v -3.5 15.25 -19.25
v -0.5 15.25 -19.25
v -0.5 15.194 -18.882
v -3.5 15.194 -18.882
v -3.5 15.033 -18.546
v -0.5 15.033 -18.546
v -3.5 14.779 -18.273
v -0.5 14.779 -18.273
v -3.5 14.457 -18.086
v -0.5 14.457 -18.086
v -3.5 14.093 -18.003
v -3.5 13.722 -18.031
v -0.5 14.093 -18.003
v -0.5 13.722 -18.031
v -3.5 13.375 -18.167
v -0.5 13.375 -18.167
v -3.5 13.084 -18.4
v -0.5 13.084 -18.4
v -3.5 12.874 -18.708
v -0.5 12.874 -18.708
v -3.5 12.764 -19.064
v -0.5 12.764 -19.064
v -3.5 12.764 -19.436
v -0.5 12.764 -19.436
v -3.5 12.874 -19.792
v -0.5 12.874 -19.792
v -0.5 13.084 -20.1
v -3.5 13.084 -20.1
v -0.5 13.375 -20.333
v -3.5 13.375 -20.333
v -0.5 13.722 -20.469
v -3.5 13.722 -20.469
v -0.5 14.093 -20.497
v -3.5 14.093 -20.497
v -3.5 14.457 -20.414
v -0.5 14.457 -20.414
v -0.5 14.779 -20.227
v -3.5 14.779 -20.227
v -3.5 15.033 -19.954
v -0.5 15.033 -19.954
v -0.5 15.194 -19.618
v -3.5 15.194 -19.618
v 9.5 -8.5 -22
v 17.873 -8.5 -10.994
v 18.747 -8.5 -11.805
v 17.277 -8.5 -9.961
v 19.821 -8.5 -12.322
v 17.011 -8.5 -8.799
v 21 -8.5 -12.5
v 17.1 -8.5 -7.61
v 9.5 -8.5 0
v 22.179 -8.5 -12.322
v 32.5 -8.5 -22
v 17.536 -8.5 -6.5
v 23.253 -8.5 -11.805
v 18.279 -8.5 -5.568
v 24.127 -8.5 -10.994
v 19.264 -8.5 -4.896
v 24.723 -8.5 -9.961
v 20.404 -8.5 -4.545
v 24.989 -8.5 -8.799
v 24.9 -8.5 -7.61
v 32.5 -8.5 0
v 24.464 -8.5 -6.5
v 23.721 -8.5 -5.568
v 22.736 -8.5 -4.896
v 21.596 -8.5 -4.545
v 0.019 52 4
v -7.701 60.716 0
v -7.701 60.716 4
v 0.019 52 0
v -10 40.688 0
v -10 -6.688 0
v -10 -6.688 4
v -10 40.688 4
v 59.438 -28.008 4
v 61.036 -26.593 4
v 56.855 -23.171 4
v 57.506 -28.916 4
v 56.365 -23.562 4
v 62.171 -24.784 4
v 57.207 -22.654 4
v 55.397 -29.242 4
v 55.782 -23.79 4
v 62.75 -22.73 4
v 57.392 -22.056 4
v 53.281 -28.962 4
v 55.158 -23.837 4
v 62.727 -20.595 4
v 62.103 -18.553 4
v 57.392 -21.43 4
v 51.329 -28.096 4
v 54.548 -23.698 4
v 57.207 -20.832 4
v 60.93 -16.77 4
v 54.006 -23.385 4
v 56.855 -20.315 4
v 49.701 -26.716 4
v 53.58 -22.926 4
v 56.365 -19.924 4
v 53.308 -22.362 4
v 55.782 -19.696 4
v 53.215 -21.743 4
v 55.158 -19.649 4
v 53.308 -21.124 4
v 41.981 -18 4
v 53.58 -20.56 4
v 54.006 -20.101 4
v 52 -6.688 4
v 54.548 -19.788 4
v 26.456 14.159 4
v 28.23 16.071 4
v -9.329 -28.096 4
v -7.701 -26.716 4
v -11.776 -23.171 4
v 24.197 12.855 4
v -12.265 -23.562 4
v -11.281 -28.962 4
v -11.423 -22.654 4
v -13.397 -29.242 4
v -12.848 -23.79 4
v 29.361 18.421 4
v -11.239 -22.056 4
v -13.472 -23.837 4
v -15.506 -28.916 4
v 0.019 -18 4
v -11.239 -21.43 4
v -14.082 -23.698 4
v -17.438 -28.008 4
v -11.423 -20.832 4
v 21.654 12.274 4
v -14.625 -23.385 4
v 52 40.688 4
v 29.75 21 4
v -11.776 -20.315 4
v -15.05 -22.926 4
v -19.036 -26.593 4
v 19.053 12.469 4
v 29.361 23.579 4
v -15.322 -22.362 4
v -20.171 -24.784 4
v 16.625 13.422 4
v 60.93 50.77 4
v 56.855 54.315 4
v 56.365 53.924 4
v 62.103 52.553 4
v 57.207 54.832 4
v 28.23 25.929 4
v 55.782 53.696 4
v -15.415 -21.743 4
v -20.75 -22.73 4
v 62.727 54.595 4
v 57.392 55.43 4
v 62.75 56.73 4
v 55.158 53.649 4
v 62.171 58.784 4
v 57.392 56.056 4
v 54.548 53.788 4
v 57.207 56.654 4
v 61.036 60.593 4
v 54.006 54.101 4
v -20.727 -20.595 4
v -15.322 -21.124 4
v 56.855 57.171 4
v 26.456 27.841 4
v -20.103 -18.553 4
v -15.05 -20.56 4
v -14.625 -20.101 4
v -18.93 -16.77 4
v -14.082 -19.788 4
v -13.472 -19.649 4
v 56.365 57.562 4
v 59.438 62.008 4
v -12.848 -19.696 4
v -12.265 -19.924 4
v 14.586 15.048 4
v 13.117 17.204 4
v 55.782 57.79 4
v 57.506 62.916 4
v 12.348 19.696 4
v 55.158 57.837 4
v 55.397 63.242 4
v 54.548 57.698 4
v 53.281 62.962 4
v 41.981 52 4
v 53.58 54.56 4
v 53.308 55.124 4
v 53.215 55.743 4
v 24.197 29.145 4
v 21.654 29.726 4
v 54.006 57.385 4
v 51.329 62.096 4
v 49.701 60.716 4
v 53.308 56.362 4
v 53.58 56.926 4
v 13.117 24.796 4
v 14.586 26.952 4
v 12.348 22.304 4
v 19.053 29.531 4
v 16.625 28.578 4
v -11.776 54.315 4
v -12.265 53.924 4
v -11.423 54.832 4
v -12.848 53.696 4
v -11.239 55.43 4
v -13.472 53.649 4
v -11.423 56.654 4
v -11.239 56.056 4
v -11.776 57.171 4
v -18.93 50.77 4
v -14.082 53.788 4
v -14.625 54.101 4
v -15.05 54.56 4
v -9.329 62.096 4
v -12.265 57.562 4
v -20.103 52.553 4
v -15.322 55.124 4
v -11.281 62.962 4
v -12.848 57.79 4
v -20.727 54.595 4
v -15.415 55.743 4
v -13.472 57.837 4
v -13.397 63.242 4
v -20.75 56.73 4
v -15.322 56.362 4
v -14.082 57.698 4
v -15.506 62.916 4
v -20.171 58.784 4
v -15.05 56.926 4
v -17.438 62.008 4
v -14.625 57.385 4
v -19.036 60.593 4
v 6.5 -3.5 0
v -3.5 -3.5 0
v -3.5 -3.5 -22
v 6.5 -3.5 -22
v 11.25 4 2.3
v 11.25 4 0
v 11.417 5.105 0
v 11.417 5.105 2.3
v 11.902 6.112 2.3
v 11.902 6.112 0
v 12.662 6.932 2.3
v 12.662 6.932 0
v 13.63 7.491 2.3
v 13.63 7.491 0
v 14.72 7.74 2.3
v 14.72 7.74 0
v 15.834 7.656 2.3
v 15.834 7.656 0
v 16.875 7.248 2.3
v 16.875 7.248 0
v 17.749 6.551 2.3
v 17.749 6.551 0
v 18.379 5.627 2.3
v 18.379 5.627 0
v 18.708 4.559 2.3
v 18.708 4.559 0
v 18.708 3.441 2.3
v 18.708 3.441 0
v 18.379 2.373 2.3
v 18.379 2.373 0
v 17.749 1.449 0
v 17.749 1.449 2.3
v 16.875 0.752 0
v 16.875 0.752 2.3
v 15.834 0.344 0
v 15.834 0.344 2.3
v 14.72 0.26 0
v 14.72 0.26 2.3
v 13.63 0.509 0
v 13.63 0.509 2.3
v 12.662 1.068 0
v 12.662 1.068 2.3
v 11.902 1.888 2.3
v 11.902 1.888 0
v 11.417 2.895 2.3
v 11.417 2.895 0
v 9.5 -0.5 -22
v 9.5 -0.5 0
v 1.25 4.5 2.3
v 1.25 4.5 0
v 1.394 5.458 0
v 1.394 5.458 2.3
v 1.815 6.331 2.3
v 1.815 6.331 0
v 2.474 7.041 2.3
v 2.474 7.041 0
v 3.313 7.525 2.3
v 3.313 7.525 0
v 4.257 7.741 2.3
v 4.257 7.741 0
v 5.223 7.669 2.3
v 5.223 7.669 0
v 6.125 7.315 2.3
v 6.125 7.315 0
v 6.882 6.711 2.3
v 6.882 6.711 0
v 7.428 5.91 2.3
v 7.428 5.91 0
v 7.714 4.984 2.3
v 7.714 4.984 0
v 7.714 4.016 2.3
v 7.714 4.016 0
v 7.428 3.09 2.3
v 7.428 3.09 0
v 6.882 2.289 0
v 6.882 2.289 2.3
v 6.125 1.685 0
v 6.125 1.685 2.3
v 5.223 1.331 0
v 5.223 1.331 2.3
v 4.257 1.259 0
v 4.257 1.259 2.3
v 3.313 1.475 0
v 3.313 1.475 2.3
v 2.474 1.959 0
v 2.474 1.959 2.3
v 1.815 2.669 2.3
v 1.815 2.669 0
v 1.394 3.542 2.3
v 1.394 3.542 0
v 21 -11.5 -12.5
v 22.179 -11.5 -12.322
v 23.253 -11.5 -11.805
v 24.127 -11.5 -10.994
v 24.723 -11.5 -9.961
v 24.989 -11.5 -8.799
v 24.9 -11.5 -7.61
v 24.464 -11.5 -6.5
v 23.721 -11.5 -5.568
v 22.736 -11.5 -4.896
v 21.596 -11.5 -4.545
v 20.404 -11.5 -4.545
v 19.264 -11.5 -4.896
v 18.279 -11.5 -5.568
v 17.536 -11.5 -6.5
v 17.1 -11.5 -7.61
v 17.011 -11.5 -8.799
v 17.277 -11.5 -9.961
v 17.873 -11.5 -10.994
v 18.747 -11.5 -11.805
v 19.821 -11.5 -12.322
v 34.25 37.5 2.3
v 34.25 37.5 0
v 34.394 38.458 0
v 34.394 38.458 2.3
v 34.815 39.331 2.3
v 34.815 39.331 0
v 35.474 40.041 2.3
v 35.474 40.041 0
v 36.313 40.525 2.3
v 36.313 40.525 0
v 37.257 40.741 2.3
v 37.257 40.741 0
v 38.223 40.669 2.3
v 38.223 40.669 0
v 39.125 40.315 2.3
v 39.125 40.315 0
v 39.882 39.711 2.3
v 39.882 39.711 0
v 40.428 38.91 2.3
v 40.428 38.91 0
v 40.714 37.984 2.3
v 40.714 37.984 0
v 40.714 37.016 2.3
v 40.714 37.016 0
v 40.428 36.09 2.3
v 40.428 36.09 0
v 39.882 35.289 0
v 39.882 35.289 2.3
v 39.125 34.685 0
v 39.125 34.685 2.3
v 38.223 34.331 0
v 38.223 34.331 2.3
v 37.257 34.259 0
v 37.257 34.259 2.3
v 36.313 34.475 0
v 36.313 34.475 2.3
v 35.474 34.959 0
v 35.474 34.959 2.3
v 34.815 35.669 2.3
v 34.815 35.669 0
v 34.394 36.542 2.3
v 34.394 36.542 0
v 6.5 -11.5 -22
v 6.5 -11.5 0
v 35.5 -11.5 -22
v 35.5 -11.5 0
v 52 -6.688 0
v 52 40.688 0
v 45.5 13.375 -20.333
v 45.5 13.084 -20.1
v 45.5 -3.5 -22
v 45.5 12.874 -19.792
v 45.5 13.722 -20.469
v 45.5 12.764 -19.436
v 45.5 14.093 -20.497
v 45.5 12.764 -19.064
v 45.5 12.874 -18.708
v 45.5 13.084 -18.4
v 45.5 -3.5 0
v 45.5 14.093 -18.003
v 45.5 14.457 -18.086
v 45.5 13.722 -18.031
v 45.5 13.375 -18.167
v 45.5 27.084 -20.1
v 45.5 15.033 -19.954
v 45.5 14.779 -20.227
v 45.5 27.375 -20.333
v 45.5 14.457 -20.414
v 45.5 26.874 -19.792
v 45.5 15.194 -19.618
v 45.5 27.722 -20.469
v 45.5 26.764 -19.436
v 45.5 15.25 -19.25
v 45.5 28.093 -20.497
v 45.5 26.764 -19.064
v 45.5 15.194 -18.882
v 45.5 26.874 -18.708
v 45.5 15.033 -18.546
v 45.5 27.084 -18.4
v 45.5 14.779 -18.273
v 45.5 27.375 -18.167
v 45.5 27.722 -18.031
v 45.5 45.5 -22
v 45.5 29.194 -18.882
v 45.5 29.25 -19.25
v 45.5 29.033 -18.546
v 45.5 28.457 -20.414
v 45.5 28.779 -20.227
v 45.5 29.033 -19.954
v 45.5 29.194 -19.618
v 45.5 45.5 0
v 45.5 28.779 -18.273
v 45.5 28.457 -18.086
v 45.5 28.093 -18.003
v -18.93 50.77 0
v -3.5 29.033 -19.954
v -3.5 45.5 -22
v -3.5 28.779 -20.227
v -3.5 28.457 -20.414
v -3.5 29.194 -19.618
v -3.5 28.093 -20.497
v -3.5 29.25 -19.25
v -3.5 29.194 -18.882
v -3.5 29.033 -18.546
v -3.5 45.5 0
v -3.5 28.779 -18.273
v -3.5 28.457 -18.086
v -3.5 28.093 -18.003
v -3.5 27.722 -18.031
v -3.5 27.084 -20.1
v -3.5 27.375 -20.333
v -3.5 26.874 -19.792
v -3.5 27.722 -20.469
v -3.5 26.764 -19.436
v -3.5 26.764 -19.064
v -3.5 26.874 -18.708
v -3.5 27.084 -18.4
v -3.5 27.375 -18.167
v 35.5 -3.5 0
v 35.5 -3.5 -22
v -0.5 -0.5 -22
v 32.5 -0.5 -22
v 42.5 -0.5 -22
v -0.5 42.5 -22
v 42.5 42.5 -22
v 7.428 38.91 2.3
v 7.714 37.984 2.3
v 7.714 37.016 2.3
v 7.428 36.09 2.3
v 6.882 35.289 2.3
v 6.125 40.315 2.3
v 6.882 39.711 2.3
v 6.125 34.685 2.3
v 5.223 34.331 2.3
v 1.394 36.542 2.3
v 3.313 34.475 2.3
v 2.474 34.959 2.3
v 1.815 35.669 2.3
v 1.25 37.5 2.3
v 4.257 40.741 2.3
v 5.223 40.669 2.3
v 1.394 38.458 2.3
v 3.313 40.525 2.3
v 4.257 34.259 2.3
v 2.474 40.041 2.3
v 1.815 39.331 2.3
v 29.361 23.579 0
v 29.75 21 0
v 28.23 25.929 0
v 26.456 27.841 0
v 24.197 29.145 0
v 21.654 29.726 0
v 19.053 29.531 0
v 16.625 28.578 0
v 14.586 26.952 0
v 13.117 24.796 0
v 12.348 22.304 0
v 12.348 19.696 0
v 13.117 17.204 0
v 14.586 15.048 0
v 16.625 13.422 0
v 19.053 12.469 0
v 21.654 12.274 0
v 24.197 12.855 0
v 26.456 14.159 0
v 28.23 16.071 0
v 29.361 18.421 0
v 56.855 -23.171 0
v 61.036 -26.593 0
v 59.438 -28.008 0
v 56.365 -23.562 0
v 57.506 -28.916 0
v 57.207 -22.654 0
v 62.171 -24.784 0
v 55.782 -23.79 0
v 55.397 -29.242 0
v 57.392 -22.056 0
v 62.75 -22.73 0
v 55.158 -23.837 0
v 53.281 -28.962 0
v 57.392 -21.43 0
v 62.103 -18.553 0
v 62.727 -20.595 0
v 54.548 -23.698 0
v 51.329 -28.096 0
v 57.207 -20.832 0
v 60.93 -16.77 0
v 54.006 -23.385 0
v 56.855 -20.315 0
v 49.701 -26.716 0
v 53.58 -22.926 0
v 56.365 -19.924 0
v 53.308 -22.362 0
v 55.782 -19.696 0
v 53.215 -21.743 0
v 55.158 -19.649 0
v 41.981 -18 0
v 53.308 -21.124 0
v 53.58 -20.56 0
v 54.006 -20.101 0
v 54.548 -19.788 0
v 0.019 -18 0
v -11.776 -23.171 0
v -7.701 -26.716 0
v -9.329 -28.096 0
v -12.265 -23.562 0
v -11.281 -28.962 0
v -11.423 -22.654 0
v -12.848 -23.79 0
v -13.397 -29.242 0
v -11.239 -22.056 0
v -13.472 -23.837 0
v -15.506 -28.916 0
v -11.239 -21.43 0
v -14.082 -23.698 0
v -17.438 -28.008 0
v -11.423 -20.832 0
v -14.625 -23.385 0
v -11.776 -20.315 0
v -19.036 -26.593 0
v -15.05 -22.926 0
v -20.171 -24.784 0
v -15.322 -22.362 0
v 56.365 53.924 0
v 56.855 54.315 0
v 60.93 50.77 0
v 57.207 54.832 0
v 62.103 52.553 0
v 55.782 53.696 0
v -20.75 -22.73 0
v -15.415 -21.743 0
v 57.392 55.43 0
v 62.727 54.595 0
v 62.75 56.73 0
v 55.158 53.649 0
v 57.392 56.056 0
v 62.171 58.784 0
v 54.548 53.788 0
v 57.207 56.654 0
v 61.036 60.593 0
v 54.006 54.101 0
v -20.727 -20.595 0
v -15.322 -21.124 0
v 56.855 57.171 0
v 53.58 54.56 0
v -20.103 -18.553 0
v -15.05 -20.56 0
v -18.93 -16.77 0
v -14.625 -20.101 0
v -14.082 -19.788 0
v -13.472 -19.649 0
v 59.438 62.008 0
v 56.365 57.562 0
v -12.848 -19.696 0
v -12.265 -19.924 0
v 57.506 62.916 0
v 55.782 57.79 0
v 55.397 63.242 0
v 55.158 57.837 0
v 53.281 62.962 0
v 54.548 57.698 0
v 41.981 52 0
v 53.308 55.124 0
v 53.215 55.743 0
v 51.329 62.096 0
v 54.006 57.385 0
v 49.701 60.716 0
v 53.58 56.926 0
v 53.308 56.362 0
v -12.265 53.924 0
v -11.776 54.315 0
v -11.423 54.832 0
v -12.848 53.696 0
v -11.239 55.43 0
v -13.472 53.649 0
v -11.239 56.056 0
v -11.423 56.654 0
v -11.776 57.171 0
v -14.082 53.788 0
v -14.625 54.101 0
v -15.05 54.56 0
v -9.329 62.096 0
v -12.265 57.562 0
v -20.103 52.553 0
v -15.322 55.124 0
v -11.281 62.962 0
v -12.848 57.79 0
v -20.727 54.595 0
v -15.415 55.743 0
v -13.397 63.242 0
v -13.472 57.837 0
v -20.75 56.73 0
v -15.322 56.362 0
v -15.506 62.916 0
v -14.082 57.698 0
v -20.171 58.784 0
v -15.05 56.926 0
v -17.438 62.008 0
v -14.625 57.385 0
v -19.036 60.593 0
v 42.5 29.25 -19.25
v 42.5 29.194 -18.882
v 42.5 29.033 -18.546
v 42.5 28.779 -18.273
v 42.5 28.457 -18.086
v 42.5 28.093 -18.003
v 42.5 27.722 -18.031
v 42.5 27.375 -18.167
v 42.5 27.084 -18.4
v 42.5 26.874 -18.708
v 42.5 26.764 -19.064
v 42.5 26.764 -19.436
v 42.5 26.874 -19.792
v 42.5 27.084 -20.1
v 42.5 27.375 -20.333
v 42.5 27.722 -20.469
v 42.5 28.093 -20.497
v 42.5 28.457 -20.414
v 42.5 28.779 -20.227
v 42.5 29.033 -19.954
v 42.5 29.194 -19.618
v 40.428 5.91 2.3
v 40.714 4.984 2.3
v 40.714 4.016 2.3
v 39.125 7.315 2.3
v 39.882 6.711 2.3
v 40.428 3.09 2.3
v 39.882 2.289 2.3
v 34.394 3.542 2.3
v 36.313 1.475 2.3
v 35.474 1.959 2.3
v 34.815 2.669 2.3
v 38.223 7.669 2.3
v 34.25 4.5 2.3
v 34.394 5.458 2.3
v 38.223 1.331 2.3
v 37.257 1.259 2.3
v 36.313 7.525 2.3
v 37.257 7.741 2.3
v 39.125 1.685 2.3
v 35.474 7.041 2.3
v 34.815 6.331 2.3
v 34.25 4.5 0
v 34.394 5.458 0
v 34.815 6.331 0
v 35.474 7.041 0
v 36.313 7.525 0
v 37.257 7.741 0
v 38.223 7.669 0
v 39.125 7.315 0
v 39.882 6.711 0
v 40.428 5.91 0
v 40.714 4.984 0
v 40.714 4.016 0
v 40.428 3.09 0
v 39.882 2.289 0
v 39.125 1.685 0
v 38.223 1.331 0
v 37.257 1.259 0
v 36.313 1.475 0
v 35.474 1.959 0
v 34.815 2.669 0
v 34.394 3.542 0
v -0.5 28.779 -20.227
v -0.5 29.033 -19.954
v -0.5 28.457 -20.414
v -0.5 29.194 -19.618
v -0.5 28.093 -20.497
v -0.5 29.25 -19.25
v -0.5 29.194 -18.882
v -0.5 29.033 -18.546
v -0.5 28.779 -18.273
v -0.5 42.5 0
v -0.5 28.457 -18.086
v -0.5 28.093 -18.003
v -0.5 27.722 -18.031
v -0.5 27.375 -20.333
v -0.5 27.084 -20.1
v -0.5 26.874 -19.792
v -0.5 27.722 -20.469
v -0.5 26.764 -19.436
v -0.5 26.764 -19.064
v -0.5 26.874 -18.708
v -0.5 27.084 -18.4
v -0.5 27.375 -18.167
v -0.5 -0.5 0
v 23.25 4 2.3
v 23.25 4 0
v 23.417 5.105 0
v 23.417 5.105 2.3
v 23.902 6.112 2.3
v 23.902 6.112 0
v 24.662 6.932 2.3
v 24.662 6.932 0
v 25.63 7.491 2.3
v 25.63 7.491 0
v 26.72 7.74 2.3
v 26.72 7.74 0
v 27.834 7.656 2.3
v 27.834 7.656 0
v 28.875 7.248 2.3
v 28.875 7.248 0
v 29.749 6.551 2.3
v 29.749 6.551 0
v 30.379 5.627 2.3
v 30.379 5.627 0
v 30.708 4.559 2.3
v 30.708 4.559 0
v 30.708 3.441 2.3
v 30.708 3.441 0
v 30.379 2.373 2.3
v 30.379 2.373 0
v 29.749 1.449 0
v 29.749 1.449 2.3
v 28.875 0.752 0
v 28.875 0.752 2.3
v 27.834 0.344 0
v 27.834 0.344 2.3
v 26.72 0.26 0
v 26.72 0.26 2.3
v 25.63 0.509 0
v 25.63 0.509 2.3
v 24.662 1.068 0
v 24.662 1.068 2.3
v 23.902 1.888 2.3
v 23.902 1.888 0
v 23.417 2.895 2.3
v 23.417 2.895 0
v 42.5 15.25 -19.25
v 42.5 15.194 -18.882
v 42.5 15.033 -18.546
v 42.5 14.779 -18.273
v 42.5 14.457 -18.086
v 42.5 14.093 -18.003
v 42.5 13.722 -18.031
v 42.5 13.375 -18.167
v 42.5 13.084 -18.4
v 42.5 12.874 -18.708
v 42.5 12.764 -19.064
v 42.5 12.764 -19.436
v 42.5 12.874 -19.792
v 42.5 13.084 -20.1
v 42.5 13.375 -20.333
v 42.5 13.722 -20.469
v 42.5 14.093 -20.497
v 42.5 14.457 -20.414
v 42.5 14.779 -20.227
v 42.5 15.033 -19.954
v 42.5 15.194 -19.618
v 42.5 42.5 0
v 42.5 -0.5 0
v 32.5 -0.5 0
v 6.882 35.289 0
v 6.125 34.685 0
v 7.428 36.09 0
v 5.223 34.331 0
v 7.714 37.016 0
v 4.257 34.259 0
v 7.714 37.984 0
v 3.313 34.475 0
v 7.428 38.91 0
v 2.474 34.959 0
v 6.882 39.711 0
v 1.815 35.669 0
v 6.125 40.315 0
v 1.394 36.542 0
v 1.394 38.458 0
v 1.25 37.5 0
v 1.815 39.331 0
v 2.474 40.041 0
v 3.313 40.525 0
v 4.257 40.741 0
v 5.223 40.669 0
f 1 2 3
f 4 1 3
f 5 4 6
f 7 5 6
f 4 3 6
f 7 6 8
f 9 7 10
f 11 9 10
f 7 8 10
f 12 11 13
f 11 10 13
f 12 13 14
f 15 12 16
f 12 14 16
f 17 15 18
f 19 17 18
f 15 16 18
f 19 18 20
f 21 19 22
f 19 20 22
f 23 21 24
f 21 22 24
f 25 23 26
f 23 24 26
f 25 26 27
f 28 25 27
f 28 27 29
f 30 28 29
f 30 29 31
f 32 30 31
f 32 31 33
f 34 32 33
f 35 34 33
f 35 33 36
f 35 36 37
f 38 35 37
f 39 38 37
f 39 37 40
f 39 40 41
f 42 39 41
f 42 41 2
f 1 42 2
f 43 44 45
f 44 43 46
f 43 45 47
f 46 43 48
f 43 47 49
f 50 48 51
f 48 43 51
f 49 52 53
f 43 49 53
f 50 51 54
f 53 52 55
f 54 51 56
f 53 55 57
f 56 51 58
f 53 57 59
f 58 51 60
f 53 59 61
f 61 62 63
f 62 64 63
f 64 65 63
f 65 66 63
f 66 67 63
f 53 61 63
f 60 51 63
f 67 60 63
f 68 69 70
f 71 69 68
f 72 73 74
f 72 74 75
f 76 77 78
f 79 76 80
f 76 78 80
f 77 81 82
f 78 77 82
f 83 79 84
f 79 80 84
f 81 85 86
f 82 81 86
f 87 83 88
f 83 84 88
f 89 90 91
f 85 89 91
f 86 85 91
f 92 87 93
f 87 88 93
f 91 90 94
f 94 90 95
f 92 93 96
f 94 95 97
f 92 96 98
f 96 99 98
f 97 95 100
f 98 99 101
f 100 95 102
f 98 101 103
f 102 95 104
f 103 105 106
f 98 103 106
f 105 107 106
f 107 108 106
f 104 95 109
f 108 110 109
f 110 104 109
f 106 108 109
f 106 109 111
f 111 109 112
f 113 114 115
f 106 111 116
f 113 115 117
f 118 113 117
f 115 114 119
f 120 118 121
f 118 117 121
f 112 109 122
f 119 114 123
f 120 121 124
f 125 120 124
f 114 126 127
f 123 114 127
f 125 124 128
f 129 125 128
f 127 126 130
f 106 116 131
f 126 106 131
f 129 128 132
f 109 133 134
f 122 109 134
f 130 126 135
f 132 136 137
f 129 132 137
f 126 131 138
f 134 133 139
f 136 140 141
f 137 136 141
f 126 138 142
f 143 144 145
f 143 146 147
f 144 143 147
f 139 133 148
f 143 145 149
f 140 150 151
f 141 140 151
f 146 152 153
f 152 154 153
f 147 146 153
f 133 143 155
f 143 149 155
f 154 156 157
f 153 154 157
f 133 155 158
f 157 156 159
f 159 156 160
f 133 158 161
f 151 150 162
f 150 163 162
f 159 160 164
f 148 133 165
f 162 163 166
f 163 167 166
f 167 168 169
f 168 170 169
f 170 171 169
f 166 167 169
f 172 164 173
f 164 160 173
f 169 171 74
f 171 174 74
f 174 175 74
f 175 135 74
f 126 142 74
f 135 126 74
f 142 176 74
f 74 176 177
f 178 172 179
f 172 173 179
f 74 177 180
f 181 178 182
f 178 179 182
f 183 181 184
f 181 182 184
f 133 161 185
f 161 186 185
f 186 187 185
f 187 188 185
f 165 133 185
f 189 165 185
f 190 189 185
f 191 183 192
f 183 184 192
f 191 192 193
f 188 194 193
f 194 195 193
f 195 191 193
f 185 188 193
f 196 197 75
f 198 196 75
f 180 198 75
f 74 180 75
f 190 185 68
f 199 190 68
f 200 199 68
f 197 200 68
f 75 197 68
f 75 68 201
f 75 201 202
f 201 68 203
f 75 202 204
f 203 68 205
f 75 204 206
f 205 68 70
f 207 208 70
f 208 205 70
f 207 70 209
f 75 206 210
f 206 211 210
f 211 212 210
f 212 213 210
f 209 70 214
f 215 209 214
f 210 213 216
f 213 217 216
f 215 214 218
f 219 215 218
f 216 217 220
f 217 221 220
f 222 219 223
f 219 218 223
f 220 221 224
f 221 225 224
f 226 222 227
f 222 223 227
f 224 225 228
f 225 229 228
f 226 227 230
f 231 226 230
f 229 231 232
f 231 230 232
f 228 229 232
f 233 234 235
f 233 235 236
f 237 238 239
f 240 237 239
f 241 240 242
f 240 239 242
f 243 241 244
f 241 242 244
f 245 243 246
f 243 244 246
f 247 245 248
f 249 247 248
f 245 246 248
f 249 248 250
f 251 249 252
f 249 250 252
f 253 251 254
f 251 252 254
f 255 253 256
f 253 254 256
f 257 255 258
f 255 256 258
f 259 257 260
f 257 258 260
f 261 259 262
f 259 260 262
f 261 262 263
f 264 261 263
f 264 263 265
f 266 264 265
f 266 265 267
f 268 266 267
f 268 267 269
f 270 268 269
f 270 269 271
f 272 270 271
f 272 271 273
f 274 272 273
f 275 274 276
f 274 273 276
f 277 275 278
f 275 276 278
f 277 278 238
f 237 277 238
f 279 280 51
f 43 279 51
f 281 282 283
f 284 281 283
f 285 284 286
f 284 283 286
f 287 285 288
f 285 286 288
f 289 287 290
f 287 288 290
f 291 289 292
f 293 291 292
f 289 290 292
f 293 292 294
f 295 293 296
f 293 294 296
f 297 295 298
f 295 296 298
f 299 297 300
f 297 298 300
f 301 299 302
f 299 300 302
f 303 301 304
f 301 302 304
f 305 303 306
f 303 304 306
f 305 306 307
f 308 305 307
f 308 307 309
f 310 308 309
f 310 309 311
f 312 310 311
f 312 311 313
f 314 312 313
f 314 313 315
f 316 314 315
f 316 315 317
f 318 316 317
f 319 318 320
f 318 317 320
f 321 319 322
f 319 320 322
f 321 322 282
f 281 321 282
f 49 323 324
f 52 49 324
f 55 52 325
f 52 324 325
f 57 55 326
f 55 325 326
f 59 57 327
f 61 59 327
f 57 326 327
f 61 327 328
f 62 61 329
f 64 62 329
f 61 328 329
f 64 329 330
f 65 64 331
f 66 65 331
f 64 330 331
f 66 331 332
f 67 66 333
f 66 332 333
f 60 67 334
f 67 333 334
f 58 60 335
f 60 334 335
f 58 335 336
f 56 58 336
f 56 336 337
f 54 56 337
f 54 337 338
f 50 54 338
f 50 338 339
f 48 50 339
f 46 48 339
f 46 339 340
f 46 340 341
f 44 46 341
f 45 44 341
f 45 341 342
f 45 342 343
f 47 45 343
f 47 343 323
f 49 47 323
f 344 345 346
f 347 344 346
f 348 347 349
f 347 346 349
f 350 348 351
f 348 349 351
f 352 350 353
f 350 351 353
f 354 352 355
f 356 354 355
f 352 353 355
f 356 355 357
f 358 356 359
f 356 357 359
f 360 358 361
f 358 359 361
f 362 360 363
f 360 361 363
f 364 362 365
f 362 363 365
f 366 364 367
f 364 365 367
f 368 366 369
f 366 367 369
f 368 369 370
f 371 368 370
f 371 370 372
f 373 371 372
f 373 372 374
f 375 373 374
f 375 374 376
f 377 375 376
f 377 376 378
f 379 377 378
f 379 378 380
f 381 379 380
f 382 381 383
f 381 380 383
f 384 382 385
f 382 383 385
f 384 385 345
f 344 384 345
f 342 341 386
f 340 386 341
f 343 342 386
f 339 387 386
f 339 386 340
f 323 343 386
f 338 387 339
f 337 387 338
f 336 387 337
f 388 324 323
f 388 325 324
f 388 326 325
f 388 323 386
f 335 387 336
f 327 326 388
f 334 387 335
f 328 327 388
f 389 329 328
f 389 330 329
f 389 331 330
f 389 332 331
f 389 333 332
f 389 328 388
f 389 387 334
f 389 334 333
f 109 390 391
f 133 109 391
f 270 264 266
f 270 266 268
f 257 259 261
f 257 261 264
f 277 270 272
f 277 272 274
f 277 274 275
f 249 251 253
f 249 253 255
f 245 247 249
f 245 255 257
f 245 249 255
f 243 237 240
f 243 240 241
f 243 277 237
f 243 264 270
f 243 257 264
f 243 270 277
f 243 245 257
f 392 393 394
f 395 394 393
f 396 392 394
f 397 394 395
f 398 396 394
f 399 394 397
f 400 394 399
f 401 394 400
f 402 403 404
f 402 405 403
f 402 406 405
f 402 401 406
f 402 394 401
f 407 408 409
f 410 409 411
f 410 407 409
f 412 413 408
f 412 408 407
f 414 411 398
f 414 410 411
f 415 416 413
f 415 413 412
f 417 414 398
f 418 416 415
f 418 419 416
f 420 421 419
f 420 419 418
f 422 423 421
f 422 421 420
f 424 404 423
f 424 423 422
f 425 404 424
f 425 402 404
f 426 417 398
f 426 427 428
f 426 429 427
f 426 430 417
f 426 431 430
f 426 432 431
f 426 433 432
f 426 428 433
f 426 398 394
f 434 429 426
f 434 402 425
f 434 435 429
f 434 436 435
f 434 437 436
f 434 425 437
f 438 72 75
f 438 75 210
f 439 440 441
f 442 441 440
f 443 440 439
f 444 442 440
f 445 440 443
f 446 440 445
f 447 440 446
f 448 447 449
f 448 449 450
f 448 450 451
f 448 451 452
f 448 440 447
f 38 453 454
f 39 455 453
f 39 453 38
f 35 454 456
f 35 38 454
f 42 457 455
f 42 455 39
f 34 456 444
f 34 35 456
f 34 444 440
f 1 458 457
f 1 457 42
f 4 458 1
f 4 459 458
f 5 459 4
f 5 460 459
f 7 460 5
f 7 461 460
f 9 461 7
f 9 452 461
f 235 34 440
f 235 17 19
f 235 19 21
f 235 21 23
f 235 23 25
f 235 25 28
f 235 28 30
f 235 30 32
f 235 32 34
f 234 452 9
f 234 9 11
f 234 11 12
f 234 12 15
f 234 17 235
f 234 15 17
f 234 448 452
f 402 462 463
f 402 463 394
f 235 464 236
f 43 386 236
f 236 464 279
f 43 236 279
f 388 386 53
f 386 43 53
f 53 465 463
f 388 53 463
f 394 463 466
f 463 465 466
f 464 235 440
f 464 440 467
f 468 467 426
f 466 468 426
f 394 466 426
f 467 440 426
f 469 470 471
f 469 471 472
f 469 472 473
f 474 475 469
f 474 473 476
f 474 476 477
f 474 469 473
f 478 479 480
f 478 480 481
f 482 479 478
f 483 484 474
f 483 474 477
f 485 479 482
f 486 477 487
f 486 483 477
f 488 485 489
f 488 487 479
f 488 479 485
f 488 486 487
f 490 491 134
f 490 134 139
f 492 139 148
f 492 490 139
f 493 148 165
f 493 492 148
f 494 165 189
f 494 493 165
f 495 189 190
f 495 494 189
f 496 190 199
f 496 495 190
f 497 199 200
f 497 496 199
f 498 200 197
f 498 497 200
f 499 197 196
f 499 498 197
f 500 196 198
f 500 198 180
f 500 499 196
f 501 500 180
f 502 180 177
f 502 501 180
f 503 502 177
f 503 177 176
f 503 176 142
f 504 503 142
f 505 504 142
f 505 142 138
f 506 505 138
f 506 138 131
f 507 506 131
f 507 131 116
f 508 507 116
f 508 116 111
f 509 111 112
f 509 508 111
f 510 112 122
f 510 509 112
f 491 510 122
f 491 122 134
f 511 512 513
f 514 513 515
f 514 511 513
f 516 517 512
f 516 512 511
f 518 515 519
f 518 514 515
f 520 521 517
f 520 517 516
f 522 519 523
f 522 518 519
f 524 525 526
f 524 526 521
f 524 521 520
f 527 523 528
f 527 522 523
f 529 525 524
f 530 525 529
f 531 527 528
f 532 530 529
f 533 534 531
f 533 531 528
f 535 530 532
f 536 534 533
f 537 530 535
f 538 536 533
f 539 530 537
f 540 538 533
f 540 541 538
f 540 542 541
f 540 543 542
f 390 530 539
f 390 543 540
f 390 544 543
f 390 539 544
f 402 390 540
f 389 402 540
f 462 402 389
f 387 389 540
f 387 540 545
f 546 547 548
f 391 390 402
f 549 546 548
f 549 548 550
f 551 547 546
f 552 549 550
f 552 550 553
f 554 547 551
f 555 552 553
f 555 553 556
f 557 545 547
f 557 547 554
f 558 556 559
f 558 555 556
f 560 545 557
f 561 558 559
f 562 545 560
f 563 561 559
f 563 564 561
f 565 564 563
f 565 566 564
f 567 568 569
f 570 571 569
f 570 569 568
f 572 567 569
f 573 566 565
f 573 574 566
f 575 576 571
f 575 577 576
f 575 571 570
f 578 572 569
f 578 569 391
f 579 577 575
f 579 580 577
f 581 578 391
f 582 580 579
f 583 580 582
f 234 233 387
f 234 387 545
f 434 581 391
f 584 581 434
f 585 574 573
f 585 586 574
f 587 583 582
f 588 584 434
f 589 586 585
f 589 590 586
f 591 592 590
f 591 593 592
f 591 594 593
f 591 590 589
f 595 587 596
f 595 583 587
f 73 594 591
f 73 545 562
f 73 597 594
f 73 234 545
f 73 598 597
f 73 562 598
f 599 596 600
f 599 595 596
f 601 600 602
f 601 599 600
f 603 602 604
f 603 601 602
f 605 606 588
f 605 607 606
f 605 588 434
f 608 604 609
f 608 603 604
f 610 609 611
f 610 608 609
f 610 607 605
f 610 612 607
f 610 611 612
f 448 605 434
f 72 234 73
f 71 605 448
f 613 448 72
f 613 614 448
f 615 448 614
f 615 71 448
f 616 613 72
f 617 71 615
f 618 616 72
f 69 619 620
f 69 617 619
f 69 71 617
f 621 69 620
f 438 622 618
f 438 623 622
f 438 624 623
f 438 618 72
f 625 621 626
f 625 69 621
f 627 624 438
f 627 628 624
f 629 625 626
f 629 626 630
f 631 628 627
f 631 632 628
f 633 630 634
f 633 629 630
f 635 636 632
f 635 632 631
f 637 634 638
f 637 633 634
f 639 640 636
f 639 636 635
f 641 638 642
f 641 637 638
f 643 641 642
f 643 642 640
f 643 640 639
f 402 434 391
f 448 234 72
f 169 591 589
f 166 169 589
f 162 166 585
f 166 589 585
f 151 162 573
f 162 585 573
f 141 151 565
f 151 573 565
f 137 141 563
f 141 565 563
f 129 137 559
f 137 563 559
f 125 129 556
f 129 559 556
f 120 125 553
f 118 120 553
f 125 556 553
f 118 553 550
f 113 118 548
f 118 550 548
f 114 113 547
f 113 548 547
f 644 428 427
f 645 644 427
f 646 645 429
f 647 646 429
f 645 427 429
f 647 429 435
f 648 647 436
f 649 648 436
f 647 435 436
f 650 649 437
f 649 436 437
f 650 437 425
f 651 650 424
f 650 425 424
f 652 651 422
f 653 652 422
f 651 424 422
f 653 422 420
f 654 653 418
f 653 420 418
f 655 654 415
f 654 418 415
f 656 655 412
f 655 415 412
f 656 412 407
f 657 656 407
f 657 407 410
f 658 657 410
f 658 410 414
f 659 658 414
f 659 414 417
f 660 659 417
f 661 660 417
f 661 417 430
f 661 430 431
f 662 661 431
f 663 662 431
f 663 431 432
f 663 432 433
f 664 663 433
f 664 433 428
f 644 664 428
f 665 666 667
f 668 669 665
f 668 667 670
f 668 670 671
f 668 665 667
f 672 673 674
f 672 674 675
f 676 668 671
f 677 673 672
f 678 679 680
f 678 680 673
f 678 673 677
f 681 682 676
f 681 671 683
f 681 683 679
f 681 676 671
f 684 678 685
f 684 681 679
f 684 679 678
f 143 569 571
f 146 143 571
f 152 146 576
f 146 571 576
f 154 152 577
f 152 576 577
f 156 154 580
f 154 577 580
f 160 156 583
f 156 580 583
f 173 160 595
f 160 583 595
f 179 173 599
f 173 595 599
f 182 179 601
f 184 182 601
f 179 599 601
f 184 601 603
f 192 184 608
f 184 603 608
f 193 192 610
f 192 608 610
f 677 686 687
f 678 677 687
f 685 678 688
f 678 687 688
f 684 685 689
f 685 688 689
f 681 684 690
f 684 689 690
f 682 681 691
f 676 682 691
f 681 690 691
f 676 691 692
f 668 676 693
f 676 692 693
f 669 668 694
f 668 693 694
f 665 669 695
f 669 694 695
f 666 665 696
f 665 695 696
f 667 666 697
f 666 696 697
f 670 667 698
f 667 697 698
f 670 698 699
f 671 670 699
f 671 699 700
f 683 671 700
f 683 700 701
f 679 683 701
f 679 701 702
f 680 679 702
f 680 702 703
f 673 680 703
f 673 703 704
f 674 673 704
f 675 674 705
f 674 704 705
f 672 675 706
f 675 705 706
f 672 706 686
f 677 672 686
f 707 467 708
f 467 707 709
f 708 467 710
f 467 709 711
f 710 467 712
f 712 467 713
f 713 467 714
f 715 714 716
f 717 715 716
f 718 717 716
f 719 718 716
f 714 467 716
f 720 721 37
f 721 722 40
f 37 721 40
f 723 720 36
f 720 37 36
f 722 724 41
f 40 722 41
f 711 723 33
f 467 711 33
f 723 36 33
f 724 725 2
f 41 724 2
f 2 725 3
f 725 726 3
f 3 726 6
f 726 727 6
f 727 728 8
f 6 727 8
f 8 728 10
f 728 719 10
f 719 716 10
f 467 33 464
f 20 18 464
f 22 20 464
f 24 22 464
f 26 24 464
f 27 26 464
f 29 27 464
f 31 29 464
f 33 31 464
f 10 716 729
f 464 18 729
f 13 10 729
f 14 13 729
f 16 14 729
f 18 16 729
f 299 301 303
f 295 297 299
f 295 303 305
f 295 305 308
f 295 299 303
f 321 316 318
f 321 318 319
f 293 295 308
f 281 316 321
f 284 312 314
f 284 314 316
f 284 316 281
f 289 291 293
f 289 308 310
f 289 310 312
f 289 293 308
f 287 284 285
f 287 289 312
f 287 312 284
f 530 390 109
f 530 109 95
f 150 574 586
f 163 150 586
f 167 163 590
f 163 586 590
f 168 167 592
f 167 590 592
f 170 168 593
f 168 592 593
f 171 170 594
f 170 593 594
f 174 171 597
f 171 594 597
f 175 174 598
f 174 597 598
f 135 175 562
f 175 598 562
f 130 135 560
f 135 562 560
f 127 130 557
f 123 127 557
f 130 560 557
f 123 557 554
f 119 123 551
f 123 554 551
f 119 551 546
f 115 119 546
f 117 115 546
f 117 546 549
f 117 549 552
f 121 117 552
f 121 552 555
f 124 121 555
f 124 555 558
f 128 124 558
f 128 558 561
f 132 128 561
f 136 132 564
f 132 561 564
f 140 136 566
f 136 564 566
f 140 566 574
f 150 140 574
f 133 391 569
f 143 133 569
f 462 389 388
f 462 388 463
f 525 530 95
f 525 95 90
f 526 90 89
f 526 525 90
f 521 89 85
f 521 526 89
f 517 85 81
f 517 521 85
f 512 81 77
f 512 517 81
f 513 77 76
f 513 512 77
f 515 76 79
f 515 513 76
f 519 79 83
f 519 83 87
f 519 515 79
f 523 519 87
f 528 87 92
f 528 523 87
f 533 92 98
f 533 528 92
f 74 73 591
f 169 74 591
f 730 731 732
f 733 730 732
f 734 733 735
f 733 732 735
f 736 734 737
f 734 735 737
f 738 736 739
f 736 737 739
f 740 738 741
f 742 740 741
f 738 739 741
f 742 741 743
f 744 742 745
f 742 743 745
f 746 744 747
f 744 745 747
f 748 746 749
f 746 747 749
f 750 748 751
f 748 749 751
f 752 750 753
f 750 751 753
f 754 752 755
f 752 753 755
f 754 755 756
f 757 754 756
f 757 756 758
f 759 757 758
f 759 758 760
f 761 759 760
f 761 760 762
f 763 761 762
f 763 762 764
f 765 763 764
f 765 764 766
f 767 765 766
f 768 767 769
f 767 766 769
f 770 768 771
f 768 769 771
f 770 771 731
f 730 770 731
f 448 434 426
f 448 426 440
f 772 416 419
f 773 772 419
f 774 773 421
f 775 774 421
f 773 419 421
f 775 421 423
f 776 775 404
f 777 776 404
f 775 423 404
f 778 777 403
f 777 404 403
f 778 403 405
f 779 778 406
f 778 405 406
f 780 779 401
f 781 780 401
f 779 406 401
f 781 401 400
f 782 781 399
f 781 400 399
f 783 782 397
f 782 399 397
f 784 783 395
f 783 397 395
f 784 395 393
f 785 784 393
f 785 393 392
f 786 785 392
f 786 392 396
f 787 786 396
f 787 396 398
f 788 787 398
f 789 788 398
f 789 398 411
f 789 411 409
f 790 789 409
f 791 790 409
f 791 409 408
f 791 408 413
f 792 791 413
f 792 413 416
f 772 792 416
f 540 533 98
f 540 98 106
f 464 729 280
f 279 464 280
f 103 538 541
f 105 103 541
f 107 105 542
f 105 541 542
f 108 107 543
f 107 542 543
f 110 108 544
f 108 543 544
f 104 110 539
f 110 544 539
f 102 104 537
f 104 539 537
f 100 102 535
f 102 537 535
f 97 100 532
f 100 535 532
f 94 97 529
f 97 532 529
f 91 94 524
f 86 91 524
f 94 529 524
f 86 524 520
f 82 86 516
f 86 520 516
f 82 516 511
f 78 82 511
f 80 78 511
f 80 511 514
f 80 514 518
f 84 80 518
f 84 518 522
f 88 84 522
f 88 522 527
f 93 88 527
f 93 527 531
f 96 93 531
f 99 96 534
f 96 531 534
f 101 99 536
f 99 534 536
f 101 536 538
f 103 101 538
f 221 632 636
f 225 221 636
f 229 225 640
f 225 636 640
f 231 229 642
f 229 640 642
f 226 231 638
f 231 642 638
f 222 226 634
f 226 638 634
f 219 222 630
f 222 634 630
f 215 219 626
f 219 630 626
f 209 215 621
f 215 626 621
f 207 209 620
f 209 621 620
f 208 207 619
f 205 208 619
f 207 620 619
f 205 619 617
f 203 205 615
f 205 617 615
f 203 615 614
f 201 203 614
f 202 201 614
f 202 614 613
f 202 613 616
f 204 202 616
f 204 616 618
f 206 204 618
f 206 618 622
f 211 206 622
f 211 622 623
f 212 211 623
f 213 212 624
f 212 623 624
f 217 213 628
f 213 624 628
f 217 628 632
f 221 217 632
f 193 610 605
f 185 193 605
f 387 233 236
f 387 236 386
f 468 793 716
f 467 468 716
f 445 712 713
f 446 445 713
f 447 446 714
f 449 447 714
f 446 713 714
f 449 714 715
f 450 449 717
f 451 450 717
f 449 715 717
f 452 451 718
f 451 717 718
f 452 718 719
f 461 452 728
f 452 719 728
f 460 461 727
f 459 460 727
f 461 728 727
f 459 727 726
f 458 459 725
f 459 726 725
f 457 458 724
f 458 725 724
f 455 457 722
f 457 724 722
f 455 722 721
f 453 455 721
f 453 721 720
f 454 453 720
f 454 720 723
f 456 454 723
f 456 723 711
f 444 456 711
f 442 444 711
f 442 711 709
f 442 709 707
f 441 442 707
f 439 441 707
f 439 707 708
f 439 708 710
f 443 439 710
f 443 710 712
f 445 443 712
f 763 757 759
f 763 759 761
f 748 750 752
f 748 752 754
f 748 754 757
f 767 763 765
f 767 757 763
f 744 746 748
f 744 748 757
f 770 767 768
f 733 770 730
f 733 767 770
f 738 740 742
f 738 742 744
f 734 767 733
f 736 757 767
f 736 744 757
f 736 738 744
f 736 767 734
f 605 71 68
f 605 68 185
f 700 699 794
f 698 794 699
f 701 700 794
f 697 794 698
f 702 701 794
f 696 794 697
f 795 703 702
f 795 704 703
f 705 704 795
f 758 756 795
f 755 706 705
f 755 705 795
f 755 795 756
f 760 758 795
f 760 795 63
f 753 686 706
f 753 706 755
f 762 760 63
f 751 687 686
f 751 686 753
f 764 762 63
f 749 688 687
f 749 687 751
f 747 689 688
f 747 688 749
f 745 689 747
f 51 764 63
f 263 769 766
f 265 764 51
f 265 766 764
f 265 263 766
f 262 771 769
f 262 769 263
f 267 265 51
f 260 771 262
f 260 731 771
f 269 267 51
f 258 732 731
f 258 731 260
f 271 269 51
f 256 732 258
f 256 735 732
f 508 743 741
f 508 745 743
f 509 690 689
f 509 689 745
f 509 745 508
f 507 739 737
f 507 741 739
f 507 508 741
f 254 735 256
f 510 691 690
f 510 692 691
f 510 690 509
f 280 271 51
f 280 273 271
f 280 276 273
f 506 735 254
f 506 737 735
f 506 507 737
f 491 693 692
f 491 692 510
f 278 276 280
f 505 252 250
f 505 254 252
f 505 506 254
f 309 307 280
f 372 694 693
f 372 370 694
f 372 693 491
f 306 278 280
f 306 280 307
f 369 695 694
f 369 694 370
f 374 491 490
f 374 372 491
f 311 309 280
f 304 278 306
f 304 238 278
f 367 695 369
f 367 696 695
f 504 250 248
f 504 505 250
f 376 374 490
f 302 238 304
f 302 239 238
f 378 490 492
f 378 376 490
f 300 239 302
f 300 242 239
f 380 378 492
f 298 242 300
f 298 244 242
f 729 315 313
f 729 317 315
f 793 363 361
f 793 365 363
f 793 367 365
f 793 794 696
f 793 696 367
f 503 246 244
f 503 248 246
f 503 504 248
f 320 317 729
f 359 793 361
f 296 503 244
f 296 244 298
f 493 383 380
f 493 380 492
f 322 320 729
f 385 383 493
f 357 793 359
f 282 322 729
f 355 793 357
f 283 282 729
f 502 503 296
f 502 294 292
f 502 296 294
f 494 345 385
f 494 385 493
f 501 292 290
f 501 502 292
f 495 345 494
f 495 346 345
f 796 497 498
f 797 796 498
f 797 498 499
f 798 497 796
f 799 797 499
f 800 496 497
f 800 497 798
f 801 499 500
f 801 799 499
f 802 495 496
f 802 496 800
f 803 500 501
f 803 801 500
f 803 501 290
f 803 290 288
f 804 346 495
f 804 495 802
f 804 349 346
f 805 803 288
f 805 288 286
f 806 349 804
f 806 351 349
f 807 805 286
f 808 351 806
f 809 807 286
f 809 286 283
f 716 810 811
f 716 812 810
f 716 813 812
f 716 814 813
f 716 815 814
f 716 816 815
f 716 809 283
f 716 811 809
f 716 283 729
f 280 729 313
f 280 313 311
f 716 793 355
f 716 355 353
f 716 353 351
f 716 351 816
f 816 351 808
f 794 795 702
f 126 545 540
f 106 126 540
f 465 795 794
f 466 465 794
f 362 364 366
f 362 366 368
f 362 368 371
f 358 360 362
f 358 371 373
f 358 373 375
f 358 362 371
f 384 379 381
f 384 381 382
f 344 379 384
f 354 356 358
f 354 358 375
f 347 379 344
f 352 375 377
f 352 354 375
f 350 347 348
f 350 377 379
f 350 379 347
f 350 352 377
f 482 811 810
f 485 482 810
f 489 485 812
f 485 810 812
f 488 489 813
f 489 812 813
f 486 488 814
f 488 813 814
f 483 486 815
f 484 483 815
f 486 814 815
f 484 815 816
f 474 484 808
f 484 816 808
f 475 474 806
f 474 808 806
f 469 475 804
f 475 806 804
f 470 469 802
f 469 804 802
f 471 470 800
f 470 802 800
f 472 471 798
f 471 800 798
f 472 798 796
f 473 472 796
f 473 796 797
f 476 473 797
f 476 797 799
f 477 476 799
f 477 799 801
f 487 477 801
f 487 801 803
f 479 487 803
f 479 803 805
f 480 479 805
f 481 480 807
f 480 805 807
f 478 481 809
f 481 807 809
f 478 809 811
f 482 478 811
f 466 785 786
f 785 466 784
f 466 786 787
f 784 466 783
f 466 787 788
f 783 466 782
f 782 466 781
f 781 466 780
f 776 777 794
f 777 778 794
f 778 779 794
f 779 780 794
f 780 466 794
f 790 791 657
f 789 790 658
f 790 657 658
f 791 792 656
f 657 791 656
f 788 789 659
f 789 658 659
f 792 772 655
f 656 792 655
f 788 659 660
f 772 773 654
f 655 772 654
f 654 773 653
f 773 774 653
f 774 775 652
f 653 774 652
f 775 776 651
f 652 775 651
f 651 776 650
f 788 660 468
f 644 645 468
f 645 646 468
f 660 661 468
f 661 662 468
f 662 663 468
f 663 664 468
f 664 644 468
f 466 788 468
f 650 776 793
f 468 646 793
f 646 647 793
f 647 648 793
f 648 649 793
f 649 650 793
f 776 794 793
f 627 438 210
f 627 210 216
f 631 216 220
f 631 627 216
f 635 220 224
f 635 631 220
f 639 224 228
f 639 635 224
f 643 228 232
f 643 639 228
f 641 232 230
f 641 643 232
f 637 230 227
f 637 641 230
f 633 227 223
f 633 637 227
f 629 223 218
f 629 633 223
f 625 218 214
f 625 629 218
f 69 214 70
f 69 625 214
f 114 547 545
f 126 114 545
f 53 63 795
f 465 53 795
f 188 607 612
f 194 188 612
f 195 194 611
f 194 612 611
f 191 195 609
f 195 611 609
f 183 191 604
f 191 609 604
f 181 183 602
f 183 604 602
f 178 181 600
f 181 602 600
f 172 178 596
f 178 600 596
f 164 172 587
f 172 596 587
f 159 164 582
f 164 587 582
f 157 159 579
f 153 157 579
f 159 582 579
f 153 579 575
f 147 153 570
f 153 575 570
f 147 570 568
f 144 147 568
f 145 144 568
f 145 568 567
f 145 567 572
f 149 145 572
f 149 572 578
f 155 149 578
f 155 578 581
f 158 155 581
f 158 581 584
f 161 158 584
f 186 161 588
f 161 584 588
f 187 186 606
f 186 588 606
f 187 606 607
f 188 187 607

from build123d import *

# Parameters (mm, degrees)
SKETCH1_W               = 62
SKETCH1_H               = 70
SKETCH1_R               = 8.75
BOTTOM_DEPTH            = 4
SKETCH2_R               = 3.25
SKETCH2_R_2             = 3.75
SCREW_INLETS_DEPTH      = 2.3
SKETCH3_R               = 2.1
MOUNTING_ARMS_DEPTH     = 4
WALLS_DEPTH             = 22
ADAPTER_BOLT_HOLE_REACH = 102.081
SKETCH5_R               = 4
M2_LOCK_HOLES_REACH     = 96.241
SKETCH7_R               = 1.25


with BuildPart() as part:
    # Sketch1 → Bottom (new body)
    with BuildSketch(Plane.XY):
        with Locations((21, 17)):
            Rectangle(SKETCH1_W, SKETCH1_H)
        with Locations((21, 21)):
            Circle(SKETCH1_R, mode=Mode.SUBTRACT)
    extrude(amount=BOTTOM_DEPTH)

    # Sketch2 → Screw_inlets (cut)
    with BuildSketch(Plane(origin=(0, 0, 0), x_dir=(-1, 0, 0), z_dir=(0, 0, -1))):
        with Locations((-37.5, 4.5)):
            Circle(SKETCH2_R)
        with Locations((-37.5, 37.5)):
            Circle(SKETCH2_R)
        with Locations((-27, 4)):
            Circle(SKETCH2_R_2)
        with Locations((-15, 4)):
            Circle(SKETCH2_R_2)
        with Locations((-4.5, 4.5)):
            Circle(SKETCH2_R)
        with Locations((-4.5, 37.5)):
            Circle(SKETCH2_R)
    extrude(amount=-SCREW_INLETS_DEPTH, mode=Mode.SUBTRACT)

    # Sketch3 → Mounting_arms (add)
    # profile 1 of 4: a face of its own
    with BuildSketch(Plane(origin=(0, 0, 0), x_dir=(-1, 0, 0), z_dir=(0, 0, -1))):
        with BuildLine():
            Line((10, 40.688384135), (18.929587578, 50.770176561))
            ThreePointArc((18.929587578, 50.770176561), (18.287940566, 61.357352252), (7.700764875, 60.715705241))
            Line((7.700764875, 60.715705241), (-0.018859766, 52))
            Line((-0.018859766, 52), (10, 52))
            Line((10, 52), (10, 40.688384135))
        make_face()
        with Locations((13.315176226, 55.742940901)):
            Circle(SKETCH3_R, mode=Mode.SUBTRACT)
    # profile 2 of 4: a face of its own
    with BuildSketch(Plane(origin=(0, 0, 0), x_dir=(-1, 0, 0), z_dir=(0, 0, -1))):
        with BuildLine():
            Line((-52, 40.688384135), (-60.929587578, 50.770176561))
            ThreePointArc((-60.929587578, 50.770176561), (-60.287940566, 61.357352252), (-49.700764875, 60.715705241))
            Line((-49.700764875, 60.715705241), (-41.981140234, 52))
            Line((-41.981140234, 52), (-52, 52))
            Line((-52, 52), (-52, 40.688384135))
        make_face()
        with Locations((-55.315176226, 55.742940901)):
            Circle(SKETCH3_R, mode=Mode.SUBTRACT)
    # profile 3 of 4: a face of its own
    with BuildSketch(Plane(origin=(0, 0, 0), x_dir=(-1, 0, 0), z_dir=(0, 0, -1))):
        with BuildLine():
            Line((10, -6.688384135), (18.929587578, -16.770176561))
            ThreePointArc((18.929587578, -16.770176561), (18.287940566, -27.357352252), (7.700764875, -26.715705241))
            Line((7.700764875, -26.715705241), (-0.018859766, -18))
            Line((-0.018859766, -18), (10, -18))
            Line((10, -18), (10, -6.688384135))
        make_face()
        with Locations((13.315176226, -21.742940901)):
            Circle(SKETCH3_R, mode=Mode.SUBTRACT)
    # profile 4 of 4: a face of its own
    with BuildSketch(Plane(origin=(0, 0, 0), x_dir=(-1, 0, 0), z_dir=(0, 0, -1))):
        with BuildLine():
            Line((-52, -18), (-52, -6.688384135))
            Line((-52, -6.688384135), (-60.929587578, -16.770176561))
            ThreePointArc((-60.929587578, -16.770176561), (-60.287940566, -27.357352252), (-49.700764875, -26.715705241))
            Line((-49.700764875, -26.715705241), (-41.981140234, -18))
            Line((-41.981140234, -18), (-52, -18))
        make_face()
        with Locations((-55.315176226, -21.742940901)):
            Circle(SKETCH3_R, mode=Mode.SUBTRACT)
    extrude(amount=-MOUNTING_ARMS_DEPTH)

    # Sketch4 → Walls (add)
    with BuildSketch(Plane(origin=(0, 0, 0), x_dir=(-1, 0, 0), z_dir=(0, 0, -1))):
        Polygon((-6.5, -11.5), (-35.5, -11.5), (-35.5, -3.5), (-45.5, -3.5), (-45.5, 45.5), (3.5, 45.5), (3.5, -3.5), (-6.5, -3.5), align=None)
        Polygon((-9.5, -8.5), (-32.5, -8.5), (-32.5, -0.5), (-42.5, -0.5), (-42.5, 42.5), (0.5, 42.5), (0.5, -0.5), (-9.5, -0.5), align=None, mode=Mode.SUBTRACT)
    extrude(amount=WALLS_DEPTH)

    # Sketch5 → Adapter_bolt_hole (cut, up to next)
    with BuildSketch(Plane.XZ.offset(11.5), mode=Mode.PRIVATE) as adapter_bolt_hole_sk1:
        with Locations(Location((21, -8.5, 0), (0, 0, 270))):
            Circle(SKETCH5_R)
    adapter_bolt_hole_tool1 = extrude(adapter_bolt_hole_sk1.sketch, amount=-ADAPTER_BOLT_HOLE_REACH, mode=Mode.PRIVATE) & part.part
    add(adapter_bolt_hole_tool1.solids().sort_by_distance((21, -11.5, -8.5))[0], mode=Mode.SUBTRACT)

    # M2_lock_holes: up to this face of the body (flat: up to its plane)
    m2_lock_holes_end = Plane(part.part.faces().sort_by_distance((-3.5, 21, -11))[0])
    # Sketch7 → M2_lock_holes (cut, up to the picked face)
    with BuildSketch(Plane(origin=(45.5, 0, 0), x_dir=(0, 0, -1), z_dir=(1, 0, 0)), mode=Mode.PRIVATE) as m2_lock_holes_sk1:
        with Locations(Location((19.25, 28, 0), (0, 0, 90))):
            Circle(SKETCH7_R)
    m2_lock_holes_tool1 = split(extrude(m2_lock_holes_sk1.sketch, amount=-M2_LOCK_HOLES_REACH, mode=Mode.PRIVATE), bisect_by=m2_lock_holes_end, keep=Keep.BOTH, mode=Mode.PRIVATE)
    # Sketch7 → M2_lock_holes (cut, up to the picked face)
    with BuildSketch(Plane(origin=(45.5, 0, 0), x_dir=(0, 0, -1), z_dir=(1, 0, 0)), mode=Mode.PRIVATE) as m2_lock_holes_sk2:
        with Locations(Location((19.25, 14, 0), (0, 0, 90))):
            Circle(SKETCH7_R)
    m2_lock_holes_tool2 = split(extrude(m2_lock_holes_sk2.sketch, amount=-M2_LOCK_HOLES_REACH, mode=Mode.PRIVATE), bisect_by=m2_lock_holes_end, keep=Keep.BOTH, mode=Mode.PRIVATE)
    add(m2_lock_holes_tool1.solids().sort_by(Axis((45.5, 28, -19.25), (-1, 0, 0)))[0], mode=Mode.SUBTRACT)
    add(m2_lock_holes_tool2.solids().sort_by(Axis((45.5, 14, -19.25), (-1, 0, 0)))[0], mode=Mode.SUBTRACT)


solid = part.part
